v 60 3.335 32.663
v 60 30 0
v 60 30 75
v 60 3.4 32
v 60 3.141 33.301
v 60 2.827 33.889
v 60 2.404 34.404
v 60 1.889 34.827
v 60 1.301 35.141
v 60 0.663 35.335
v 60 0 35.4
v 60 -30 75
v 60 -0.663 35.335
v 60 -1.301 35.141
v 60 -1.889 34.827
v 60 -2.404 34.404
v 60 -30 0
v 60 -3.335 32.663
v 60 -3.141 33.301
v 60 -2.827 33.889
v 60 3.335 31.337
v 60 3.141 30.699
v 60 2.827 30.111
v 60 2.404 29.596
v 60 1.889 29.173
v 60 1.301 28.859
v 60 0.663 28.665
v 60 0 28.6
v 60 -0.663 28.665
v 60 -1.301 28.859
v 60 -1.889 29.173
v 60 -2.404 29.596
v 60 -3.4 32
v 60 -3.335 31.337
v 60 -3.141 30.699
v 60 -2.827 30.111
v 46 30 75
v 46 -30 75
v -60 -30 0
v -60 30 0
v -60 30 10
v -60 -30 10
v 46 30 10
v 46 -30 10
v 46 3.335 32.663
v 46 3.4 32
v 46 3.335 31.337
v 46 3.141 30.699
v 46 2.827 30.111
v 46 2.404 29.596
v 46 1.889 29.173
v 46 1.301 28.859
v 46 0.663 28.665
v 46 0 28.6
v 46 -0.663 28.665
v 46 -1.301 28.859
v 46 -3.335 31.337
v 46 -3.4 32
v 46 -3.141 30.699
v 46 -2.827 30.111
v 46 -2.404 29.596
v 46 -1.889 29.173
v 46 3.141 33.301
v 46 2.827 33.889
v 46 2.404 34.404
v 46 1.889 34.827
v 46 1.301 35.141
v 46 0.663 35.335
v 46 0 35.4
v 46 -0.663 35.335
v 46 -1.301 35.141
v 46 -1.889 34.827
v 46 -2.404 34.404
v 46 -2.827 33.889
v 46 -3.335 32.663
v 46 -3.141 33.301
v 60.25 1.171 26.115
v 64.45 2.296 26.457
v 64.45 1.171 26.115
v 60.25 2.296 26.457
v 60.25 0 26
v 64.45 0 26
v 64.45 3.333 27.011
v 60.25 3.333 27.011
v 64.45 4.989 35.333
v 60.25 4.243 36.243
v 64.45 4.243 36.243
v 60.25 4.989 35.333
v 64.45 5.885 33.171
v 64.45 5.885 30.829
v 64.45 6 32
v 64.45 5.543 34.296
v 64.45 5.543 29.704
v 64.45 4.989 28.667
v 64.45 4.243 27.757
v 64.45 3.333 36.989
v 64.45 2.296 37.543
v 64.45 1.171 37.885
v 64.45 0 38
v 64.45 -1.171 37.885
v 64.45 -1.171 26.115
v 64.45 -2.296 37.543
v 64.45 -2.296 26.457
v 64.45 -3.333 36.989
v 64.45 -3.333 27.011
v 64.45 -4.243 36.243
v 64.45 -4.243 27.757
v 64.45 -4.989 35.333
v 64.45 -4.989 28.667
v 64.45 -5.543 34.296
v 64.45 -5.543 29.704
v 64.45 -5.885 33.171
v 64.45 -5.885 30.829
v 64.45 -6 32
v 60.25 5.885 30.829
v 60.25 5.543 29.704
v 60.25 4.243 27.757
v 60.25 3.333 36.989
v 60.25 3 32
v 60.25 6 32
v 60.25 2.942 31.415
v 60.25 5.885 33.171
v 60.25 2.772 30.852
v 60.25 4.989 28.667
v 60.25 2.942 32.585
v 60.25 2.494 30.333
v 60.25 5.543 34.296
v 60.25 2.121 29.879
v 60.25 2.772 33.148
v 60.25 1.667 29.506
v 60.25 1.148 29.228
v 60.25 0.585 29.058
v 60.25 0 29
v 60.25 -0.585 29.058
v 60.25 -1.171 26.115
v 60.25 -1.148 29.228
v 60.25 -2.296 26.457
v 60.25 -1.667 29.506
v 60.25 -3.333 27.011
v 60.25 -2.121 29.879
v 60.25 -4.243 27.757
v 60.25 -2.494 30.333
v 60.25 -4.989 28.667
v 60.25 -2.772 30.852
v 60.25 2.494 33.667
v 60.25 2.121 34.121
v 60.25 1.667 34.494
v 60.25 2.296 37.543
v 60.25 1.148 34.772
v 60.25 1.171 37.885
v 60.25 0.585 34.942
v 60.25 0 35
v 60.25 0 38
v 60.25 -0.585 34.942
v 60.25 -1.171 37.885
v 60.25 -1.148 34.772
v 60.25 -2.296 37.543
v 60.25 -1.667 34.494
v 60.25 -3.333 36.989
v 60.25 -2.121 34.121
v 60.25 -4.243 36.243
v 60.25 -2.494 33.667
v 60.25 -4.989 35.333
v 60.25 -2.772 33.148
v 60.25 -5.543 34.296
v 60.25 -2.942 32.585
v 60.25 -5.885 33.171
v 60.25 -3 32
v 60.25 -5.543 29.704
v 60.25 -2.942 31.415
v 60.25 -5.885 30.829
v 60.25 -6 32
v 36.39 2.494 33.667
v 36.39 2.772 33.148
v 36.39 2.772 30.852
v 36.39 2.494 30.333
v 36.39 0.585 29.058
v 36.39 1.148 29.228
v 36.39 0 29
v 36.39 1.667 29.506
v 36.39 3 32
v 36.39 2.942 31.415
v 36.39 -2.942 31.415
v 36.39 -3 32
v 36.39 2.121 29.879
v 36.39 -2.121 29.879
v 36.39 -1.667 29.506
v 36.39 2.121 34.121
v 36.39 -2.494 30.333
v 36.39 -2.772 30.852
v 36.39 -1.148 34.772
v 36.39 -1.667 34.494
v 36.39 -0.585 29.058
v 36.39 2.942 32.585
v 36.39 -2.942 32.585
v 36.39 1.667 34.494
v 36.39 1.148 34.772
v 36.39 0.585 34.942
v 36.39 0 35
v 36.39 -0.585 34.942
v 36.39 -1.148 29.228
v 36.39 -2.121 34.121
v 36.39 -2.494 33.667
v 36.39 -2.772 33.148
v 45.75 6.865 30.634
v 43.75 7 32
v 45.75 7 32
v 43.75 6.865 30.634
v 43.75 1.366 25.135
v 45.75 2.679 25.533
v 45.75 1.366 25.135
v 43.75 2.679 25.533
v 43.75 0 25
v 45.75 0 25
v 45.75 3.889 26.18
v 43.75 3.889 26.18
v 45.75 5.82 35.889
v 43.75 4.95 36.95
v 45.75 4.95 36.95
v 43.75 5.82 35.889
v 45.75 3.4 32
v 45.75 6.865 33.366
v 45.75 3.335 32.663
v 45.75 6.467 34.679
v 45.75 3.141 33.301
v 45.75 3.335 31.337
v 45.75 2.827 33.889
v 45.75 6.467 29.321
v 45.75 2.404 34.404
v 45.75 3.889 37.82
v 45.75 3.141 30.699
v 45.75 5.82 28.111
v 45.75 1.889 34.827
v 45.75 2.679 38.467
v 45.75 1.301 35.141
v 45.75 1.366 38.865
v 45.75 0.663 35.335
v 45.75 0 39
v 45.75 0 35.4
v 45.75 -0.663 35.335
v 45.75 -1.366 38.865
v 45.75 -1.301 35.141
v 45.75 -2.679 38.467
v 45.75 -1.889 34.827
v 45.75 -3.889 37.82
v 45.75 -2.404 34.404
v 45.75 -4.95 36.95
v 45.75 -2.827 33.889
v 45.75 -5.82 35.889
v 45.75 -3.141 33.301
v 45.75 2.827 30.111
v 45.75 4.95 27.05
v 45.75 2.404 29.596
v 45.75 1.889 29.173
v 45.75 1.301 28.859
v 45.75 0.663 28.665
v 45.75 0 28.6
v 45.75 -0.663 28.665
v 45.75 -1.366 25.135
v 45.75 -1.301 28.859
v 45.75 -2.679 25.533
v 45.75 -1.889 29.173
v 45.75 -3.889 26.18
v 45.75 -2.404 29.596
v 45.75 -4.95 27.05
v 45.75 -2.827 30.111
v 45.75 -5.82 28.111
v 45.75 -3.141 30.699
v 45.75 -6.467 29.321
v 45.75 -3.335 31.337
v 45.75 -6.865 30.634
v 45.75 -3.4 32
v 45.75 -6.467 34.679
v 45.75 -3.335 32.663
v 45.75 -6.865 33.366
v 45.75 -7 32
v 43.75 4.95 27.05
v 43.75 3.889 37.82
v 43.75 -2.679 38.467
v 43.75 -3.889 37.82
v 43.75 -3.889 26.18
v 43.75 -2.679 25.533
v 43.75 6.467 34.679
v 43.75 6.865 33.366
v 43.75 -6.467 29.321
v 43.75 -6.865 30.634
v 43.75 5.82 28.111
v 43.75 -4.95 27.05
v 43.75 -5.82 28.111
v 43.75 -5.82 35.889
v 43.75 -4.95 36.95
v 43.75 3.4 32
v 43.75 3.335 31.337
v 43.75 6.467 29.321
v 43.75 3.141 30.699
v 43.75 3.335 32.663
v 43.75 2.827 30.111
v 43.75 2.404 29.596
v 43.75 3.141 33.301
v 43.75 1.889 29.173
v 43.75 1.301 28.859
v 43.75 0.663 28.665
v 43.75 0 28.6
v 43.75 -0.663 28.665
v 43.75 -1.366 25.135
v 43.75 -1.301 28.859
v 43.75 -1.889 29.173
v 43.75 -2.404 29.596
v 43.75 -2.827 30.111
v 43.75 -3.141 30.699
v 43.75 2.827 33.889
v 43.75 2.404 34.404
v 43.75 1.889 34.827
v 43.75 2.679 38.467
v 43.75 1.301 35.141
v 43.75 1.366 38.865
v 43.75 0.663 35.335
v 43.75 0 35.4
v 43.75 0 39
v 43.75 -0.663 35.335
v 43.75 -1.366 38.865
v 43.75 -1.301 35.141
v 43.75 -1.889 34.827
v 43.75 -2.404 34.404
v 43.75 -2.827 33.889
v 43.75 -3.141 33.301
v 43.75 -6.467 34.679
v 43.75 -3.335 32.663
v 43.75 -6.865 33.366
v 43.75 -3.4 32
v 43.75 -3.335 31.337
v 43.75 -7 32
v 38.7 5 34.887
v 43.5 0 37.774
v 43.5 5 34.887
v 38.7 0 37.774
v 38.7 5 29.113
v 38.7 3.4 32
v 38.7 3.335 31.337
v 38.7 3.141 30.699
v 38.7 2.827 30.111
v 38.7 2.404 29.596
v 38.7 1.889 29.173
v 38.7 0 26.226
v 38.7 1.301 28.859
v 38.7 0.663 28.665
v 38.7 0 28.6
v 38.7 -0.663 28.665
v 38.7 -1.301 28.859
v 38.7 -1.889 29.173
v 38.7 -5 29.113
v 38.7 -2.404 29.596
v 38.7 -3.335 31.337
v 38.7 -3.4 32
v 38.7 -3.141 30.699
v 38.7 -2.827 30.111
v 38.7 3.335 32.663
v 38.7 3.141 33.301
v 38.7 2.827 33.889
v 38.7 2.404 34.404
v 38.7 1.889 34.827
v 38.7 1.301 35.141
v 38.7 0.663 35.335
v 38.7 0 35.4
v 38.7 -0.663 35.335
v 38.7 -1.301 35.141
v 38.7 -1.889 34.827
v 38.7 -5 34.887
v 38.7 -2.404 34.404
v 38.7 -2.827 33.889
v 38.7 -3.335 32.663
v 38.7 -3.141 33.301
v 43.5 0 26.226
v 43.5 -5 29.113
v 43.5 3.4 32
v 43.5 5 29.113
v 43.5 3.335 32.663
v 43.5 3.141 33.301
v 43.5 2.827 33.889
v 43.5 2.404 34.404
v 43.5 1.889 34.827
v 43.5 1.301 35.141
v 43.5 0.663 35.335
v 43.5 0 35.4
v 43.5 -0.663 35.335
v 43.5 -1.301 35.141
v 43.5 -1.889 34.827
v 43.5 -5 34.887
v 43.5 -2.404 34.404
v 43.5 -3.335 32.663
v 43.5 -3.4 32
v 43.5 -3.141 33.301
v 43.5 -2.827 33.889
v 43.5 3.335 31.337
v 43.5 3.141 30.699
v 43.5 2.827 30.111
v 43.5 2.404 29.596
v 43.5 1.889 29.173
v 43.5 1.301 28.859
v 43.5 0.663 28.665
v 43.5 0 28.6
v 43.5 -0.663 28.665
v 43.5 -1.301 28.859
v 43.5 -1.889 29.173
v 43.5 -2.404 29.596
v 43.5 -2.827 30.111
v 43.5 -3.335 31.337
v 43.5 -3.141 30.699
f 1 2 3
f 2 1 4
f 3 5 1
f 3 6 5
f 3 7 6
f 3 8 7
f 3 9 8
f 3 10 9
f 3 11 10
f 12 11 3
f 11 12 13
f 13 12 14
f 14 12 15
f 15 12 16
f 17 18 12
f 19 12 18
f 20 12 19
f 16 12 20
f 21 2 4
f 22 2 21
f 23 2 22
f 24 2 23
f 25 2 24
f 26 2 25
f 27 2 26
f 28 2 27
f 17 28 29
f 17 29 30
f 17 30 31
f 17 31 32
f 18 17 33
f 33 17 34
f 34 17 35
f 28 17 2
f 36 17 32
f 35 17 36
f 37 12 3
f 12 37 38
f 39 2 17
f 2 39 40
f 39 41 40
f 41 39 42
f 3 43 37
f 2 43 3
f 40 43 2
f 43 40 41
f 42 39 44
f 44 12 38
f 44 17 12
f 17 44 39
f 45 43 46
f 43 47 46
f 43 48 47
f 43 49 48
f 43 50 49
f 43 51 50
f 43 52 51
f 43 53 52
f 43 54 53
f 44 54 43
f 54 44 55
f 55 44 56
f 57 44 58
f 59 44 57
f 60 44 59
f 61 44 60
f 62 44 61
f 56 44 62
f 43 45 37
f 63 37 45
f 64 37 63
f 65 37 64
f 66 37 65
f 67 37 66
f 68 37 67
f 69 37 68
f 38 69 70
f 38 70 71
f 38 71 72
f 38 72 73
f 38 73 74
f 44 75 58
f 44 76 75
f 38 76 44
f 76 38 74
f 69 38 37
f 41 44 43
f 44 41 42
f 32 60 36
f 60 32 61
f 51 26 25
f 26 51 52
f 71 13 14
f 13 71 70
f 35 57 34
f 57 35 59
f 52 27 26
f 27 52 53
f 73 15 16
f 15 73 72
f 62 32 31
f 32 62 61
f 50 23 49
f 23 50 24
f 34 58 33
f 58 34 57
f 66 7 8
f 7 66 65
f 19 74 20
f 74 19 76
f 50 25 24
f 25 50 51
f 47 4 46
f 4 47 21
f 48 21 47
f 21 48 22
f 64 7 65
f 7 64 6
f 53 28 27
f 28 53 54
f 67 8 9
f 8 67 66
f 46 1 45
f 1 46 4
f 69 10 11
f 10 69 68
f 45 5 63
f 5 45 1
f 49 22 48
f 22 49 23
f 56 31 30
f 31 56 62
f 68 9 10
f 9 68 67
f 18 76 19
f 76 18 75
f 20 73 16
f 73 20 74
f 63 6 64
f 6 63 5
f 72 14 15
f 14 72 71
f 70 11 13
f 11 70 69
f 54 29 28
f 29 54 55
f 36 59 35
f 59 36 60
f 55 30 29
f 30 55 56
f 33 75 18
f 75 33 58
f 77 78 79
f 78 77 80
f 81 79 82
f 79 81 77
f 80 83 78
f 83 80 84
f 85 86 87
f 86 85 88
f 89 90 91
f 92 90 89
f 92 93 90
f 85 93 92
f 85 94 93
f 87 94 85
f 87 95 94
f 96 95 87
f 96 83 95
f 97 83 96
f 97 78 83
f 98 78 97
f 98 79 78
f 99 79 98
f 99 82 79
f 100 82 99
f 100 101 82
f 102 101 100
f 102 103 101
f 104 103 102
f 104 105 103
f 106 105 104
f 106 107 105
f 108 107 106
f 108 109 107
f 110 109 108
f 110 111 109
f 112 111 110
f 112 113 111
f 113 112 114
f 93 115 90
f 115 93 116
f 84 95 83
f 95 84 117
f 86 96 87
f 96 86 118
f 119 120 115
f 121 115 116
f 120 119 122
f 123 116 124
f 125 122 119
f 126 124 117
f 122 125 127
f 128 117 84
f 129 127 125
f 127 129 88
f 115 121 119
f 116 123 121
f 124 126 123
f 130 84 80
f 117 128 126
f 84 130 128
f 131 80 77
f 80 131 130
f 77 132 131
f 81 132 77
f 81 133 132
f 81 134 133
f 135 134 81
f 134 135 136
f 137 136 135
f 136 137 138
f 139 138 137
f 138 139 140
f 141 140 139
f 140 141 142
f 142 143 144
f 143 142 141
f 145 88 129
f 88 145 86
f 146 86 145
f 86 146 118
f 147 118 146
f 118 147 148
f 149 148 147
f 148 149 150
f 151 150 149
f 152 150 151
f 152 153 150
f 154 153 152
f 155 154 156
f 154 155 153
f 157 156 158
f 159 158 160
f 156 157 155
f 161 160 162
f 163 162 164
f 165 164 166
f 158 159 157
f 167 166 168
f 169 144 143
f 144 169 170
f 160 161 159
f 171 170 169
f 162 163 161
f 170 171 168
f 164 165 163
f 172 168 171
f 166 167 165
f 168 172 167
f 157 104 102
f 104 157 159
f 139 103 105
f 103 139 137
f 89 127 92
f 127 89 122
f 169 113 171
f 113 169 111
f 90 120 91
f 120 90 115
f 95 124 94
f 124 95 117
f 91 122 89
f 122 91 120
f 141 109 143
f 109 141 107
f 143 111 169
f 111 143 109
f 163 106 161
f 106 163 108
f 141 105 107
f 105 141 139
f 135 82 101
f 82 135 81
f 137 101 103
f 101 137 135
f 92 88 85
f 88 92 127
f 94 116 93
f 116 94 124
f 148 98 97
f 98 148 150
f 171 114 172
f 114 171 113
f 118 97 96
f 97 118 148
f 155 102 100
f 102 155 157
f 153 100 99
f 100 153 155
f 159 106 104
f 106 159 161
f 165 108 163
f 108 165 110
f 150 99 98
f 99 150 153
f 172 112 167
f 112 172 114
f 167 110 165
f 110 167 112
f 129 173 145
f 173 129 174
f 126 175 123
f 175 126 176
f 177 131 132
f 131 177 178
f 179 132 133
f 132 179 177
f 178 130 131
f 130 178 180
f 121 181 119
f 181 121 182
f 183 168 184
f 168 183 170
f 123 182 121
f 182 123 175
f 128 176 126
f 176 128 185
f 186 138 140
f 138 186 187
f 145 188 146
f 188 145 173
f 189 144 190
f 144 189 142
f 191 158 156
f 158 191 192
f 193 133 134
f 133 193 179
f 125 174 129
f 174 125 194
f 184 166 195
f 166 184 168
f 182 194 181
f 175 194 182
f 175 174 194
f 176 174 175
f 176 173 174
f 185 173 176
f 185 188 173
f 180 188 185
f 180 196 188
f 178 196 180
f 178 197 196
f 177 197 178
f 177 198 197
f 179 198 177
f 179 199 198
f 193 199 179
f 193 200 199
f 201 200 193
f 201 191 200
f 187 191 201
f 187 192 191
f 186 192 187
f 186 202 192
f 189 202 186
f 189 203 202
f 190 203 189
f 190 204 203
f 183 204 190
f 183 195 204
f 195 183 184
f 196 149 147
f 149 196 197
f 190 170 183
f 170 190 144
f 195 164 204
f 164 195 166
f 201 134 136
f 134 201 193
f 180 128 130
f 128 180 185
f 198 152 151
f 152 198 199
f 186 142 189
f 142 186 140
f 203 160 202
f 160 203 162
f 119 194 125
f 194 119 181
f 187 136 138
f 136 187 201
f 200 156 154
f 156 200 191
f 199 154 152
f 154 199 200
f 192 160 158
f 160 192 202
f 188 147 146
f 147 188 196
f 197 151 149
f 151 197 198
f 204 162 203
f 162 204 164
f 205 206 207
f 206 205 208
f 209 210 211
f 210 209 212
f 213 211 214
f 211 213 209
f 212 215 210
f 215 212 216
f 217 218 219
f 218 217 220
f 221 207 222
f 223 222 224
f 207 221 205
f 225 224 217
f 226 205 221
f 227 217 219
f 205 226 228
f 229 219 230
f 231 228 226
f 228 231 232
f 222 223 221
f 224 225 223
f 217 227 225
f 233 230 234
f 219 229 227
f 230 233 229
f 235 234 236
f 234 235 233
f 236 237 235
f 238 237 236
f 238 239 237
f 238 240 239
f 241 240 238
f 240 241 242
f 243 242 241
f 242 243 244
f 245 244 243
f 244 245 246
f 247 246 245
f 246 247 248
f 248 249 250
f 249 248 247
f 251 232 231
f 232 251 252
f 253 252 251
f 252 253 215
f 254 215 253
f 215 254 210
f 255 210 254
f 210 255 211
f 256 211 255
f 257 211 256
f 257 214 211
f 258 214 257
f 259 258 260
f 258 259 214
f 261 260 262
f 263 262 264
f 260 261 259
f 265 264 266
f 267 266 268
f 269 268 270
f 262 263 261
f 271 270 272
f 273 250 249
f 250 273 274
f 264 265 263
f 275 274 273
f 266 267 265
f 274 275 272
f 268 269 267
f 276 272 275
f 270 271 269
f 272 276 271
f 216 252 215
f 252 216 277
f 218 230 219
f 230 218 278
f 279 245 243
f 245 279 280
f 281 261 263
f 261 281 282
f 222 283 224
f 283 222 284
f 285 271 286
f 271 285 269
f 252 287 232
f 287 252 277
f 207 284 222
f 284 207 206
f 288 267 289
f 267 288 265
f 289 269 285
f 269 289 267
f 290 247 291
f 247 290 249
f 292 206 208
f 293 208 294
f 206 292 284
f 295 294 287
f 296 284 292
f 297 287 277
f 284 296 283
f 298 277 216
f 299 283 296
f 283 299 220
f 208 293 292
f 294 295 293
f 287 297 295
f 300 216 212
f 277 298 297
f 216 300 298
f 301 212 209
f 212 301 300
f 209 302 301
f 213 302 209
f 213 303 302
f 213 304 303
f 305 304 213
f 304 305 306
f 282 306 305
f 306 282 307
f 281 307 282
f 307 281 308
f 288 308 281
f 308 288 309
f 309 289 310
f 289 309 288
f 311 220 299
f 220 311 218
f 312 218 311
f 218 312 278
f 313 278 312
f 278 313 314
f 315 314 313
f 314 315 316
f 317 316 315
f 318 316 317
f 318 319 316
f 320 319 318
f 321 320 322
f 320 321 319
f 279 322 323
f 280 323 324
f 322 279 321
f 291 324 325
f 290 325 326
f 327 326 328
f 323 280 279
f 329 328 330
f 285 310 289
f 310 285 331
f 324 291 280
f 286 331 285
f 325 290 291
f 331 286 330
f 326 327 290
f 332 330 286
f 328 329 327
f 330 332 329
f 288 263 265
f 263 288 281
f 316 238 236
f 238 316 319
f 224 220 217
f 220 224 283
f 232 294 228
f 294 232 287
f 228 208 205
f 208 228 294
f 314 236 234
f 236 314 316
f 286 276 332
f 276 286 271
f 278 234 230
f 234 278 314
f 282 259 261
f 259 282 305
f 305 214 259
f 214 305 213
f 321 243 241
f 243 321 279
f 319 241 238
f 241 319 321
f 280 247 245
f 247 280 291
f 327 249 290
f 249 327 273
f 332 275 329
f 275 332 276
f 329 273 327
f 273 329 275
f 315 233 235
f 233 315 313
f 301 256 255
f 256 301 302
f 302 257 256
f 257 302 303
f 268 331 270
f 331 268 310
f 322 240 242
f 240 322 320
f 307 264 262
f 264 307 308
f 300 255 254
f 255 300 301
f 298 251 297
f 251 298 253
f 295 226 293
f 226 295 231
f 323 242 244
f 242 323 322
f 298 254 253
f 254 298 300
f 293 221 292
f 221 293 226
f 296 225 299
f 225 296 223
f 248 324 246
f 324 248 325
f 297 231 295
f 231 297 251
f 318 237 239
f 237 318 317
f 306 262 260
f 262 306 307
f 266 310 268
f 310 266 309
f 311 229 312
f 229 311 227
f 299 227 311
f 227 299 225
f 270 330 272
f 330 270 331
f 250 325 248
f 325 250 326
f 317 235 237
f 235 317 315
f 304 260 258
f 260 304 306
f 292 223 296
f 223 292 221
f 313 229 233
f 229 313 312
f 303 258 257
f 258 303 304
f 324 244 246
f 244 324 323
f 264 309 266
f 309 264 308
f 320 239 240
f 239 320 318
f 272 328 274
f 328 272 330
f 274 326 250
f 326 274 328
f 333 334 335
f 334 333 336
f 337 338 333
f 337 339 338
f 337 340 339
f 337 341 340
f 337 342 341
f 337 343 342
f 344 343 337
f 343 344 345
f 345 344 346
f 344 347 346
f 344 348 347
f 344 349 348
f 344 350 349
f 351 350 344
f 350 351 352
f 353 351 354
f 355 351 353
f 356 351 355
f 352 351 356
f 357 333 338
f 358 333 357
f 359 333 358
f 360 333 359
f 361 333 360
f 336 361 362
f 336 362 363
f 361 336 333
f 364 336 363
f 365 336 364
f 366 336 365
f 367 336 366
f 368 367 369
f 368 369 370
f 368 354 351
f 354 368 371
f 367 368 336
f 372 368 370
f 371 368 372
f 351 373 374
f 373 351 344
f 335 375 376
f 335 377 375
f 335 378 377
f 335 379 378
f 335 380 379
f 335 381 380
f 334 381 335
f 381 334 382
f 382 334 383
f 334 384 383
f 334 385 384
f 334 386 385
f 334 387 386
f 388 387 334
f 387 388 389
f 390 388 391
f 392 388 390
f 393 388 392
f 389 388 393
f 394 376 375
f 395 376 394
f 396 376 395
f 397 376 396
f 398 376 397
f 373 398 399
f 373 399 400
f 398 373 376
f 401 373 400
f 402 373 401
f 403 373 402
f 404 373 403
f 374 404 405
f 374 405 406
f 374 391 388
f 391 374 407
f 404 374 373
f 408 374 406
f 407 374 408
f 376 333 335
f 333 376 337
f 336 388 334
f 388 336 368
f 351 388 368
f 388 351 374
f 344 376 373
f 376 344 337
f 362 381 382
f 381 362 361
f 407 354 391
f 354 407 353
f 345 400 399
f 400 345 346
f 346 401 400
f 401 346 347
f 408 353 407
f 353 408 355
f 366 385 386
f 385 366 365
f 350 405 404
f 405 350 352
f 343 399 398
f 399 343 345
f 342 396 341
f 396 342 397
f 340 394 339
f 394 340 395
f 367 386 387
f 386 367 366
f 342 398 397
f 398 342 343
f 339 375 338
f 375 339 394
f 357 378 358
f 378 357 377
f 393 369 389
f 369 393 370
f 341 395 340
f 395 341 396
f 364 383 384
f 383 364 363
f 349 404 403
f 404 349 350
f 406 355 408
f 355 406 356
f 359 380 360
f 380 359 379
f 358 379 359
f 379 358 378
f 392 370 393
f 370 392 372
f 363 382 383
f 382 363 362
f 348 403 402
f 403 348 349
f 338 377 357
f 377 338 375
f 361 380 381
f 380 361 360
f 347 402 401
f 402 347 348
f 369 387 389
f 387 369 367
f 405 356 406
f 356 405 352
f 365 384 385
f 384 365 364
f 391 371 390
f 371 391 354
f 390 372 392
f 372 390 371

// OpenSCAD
$fn = 32;

// ------------------------------------------------------------------------
// Bolted bracket: 120 x 60 mm bracket with 1 bolt joints
// Every part is its own module, assembly() places them once.
// ------------------------------------------------------------------------

// --- part 1 ---
module bracket() {
  difference() {
    translate([-60, -30, 0]) cube([120, 60, 75]);
    translate([-61, -31, 10]) cube([107, 62, 66]);
    translate([53, 0, 32]) rotate([0, 90, 0]) cylinder(h = 16, d = 6.8, center = true);
  }
}

// --- part 2 ---
module bolt() {
  cylinder(h = 4.2, d = 12);
  translate([0, 0, -23.86]) cylinder(h = 23.86, d = 6);
}

// --- part 3 ---
module washer() {
  difference() {
      translate([0, 0, 0]) cylinder(h = 2, d = 14);
      translate([0, 0, -1]) cylinder(h = 4, d = 6.8);
    }
}

// --- part 4 ---
module nut() {
  difference() {
    linear_extrude(height = 4.8) polygon(points = [[5.774, 0], [2.887, 5], [-2.887, 5], [-5.774, 0], [-2.887, -5], [2.887, -5]]);
    translate([0, 0, -1]) cylinder(h = 6.8, d = 6.8);
  }
}

// --- assembly ---
module assembly() {
  translate([0, 0, 0]) rotate([0, 0, 0]) bracket();
  translate([60.25, 0, 32]) rotate([0, 90, 0]) bolt();
  translate([43.75, 0, 32]) rotate([0, 90, 0]) washer();
  translate([38.7, 0, 32]) rotate([0, 90, 0]) nut();
}

assembly();
